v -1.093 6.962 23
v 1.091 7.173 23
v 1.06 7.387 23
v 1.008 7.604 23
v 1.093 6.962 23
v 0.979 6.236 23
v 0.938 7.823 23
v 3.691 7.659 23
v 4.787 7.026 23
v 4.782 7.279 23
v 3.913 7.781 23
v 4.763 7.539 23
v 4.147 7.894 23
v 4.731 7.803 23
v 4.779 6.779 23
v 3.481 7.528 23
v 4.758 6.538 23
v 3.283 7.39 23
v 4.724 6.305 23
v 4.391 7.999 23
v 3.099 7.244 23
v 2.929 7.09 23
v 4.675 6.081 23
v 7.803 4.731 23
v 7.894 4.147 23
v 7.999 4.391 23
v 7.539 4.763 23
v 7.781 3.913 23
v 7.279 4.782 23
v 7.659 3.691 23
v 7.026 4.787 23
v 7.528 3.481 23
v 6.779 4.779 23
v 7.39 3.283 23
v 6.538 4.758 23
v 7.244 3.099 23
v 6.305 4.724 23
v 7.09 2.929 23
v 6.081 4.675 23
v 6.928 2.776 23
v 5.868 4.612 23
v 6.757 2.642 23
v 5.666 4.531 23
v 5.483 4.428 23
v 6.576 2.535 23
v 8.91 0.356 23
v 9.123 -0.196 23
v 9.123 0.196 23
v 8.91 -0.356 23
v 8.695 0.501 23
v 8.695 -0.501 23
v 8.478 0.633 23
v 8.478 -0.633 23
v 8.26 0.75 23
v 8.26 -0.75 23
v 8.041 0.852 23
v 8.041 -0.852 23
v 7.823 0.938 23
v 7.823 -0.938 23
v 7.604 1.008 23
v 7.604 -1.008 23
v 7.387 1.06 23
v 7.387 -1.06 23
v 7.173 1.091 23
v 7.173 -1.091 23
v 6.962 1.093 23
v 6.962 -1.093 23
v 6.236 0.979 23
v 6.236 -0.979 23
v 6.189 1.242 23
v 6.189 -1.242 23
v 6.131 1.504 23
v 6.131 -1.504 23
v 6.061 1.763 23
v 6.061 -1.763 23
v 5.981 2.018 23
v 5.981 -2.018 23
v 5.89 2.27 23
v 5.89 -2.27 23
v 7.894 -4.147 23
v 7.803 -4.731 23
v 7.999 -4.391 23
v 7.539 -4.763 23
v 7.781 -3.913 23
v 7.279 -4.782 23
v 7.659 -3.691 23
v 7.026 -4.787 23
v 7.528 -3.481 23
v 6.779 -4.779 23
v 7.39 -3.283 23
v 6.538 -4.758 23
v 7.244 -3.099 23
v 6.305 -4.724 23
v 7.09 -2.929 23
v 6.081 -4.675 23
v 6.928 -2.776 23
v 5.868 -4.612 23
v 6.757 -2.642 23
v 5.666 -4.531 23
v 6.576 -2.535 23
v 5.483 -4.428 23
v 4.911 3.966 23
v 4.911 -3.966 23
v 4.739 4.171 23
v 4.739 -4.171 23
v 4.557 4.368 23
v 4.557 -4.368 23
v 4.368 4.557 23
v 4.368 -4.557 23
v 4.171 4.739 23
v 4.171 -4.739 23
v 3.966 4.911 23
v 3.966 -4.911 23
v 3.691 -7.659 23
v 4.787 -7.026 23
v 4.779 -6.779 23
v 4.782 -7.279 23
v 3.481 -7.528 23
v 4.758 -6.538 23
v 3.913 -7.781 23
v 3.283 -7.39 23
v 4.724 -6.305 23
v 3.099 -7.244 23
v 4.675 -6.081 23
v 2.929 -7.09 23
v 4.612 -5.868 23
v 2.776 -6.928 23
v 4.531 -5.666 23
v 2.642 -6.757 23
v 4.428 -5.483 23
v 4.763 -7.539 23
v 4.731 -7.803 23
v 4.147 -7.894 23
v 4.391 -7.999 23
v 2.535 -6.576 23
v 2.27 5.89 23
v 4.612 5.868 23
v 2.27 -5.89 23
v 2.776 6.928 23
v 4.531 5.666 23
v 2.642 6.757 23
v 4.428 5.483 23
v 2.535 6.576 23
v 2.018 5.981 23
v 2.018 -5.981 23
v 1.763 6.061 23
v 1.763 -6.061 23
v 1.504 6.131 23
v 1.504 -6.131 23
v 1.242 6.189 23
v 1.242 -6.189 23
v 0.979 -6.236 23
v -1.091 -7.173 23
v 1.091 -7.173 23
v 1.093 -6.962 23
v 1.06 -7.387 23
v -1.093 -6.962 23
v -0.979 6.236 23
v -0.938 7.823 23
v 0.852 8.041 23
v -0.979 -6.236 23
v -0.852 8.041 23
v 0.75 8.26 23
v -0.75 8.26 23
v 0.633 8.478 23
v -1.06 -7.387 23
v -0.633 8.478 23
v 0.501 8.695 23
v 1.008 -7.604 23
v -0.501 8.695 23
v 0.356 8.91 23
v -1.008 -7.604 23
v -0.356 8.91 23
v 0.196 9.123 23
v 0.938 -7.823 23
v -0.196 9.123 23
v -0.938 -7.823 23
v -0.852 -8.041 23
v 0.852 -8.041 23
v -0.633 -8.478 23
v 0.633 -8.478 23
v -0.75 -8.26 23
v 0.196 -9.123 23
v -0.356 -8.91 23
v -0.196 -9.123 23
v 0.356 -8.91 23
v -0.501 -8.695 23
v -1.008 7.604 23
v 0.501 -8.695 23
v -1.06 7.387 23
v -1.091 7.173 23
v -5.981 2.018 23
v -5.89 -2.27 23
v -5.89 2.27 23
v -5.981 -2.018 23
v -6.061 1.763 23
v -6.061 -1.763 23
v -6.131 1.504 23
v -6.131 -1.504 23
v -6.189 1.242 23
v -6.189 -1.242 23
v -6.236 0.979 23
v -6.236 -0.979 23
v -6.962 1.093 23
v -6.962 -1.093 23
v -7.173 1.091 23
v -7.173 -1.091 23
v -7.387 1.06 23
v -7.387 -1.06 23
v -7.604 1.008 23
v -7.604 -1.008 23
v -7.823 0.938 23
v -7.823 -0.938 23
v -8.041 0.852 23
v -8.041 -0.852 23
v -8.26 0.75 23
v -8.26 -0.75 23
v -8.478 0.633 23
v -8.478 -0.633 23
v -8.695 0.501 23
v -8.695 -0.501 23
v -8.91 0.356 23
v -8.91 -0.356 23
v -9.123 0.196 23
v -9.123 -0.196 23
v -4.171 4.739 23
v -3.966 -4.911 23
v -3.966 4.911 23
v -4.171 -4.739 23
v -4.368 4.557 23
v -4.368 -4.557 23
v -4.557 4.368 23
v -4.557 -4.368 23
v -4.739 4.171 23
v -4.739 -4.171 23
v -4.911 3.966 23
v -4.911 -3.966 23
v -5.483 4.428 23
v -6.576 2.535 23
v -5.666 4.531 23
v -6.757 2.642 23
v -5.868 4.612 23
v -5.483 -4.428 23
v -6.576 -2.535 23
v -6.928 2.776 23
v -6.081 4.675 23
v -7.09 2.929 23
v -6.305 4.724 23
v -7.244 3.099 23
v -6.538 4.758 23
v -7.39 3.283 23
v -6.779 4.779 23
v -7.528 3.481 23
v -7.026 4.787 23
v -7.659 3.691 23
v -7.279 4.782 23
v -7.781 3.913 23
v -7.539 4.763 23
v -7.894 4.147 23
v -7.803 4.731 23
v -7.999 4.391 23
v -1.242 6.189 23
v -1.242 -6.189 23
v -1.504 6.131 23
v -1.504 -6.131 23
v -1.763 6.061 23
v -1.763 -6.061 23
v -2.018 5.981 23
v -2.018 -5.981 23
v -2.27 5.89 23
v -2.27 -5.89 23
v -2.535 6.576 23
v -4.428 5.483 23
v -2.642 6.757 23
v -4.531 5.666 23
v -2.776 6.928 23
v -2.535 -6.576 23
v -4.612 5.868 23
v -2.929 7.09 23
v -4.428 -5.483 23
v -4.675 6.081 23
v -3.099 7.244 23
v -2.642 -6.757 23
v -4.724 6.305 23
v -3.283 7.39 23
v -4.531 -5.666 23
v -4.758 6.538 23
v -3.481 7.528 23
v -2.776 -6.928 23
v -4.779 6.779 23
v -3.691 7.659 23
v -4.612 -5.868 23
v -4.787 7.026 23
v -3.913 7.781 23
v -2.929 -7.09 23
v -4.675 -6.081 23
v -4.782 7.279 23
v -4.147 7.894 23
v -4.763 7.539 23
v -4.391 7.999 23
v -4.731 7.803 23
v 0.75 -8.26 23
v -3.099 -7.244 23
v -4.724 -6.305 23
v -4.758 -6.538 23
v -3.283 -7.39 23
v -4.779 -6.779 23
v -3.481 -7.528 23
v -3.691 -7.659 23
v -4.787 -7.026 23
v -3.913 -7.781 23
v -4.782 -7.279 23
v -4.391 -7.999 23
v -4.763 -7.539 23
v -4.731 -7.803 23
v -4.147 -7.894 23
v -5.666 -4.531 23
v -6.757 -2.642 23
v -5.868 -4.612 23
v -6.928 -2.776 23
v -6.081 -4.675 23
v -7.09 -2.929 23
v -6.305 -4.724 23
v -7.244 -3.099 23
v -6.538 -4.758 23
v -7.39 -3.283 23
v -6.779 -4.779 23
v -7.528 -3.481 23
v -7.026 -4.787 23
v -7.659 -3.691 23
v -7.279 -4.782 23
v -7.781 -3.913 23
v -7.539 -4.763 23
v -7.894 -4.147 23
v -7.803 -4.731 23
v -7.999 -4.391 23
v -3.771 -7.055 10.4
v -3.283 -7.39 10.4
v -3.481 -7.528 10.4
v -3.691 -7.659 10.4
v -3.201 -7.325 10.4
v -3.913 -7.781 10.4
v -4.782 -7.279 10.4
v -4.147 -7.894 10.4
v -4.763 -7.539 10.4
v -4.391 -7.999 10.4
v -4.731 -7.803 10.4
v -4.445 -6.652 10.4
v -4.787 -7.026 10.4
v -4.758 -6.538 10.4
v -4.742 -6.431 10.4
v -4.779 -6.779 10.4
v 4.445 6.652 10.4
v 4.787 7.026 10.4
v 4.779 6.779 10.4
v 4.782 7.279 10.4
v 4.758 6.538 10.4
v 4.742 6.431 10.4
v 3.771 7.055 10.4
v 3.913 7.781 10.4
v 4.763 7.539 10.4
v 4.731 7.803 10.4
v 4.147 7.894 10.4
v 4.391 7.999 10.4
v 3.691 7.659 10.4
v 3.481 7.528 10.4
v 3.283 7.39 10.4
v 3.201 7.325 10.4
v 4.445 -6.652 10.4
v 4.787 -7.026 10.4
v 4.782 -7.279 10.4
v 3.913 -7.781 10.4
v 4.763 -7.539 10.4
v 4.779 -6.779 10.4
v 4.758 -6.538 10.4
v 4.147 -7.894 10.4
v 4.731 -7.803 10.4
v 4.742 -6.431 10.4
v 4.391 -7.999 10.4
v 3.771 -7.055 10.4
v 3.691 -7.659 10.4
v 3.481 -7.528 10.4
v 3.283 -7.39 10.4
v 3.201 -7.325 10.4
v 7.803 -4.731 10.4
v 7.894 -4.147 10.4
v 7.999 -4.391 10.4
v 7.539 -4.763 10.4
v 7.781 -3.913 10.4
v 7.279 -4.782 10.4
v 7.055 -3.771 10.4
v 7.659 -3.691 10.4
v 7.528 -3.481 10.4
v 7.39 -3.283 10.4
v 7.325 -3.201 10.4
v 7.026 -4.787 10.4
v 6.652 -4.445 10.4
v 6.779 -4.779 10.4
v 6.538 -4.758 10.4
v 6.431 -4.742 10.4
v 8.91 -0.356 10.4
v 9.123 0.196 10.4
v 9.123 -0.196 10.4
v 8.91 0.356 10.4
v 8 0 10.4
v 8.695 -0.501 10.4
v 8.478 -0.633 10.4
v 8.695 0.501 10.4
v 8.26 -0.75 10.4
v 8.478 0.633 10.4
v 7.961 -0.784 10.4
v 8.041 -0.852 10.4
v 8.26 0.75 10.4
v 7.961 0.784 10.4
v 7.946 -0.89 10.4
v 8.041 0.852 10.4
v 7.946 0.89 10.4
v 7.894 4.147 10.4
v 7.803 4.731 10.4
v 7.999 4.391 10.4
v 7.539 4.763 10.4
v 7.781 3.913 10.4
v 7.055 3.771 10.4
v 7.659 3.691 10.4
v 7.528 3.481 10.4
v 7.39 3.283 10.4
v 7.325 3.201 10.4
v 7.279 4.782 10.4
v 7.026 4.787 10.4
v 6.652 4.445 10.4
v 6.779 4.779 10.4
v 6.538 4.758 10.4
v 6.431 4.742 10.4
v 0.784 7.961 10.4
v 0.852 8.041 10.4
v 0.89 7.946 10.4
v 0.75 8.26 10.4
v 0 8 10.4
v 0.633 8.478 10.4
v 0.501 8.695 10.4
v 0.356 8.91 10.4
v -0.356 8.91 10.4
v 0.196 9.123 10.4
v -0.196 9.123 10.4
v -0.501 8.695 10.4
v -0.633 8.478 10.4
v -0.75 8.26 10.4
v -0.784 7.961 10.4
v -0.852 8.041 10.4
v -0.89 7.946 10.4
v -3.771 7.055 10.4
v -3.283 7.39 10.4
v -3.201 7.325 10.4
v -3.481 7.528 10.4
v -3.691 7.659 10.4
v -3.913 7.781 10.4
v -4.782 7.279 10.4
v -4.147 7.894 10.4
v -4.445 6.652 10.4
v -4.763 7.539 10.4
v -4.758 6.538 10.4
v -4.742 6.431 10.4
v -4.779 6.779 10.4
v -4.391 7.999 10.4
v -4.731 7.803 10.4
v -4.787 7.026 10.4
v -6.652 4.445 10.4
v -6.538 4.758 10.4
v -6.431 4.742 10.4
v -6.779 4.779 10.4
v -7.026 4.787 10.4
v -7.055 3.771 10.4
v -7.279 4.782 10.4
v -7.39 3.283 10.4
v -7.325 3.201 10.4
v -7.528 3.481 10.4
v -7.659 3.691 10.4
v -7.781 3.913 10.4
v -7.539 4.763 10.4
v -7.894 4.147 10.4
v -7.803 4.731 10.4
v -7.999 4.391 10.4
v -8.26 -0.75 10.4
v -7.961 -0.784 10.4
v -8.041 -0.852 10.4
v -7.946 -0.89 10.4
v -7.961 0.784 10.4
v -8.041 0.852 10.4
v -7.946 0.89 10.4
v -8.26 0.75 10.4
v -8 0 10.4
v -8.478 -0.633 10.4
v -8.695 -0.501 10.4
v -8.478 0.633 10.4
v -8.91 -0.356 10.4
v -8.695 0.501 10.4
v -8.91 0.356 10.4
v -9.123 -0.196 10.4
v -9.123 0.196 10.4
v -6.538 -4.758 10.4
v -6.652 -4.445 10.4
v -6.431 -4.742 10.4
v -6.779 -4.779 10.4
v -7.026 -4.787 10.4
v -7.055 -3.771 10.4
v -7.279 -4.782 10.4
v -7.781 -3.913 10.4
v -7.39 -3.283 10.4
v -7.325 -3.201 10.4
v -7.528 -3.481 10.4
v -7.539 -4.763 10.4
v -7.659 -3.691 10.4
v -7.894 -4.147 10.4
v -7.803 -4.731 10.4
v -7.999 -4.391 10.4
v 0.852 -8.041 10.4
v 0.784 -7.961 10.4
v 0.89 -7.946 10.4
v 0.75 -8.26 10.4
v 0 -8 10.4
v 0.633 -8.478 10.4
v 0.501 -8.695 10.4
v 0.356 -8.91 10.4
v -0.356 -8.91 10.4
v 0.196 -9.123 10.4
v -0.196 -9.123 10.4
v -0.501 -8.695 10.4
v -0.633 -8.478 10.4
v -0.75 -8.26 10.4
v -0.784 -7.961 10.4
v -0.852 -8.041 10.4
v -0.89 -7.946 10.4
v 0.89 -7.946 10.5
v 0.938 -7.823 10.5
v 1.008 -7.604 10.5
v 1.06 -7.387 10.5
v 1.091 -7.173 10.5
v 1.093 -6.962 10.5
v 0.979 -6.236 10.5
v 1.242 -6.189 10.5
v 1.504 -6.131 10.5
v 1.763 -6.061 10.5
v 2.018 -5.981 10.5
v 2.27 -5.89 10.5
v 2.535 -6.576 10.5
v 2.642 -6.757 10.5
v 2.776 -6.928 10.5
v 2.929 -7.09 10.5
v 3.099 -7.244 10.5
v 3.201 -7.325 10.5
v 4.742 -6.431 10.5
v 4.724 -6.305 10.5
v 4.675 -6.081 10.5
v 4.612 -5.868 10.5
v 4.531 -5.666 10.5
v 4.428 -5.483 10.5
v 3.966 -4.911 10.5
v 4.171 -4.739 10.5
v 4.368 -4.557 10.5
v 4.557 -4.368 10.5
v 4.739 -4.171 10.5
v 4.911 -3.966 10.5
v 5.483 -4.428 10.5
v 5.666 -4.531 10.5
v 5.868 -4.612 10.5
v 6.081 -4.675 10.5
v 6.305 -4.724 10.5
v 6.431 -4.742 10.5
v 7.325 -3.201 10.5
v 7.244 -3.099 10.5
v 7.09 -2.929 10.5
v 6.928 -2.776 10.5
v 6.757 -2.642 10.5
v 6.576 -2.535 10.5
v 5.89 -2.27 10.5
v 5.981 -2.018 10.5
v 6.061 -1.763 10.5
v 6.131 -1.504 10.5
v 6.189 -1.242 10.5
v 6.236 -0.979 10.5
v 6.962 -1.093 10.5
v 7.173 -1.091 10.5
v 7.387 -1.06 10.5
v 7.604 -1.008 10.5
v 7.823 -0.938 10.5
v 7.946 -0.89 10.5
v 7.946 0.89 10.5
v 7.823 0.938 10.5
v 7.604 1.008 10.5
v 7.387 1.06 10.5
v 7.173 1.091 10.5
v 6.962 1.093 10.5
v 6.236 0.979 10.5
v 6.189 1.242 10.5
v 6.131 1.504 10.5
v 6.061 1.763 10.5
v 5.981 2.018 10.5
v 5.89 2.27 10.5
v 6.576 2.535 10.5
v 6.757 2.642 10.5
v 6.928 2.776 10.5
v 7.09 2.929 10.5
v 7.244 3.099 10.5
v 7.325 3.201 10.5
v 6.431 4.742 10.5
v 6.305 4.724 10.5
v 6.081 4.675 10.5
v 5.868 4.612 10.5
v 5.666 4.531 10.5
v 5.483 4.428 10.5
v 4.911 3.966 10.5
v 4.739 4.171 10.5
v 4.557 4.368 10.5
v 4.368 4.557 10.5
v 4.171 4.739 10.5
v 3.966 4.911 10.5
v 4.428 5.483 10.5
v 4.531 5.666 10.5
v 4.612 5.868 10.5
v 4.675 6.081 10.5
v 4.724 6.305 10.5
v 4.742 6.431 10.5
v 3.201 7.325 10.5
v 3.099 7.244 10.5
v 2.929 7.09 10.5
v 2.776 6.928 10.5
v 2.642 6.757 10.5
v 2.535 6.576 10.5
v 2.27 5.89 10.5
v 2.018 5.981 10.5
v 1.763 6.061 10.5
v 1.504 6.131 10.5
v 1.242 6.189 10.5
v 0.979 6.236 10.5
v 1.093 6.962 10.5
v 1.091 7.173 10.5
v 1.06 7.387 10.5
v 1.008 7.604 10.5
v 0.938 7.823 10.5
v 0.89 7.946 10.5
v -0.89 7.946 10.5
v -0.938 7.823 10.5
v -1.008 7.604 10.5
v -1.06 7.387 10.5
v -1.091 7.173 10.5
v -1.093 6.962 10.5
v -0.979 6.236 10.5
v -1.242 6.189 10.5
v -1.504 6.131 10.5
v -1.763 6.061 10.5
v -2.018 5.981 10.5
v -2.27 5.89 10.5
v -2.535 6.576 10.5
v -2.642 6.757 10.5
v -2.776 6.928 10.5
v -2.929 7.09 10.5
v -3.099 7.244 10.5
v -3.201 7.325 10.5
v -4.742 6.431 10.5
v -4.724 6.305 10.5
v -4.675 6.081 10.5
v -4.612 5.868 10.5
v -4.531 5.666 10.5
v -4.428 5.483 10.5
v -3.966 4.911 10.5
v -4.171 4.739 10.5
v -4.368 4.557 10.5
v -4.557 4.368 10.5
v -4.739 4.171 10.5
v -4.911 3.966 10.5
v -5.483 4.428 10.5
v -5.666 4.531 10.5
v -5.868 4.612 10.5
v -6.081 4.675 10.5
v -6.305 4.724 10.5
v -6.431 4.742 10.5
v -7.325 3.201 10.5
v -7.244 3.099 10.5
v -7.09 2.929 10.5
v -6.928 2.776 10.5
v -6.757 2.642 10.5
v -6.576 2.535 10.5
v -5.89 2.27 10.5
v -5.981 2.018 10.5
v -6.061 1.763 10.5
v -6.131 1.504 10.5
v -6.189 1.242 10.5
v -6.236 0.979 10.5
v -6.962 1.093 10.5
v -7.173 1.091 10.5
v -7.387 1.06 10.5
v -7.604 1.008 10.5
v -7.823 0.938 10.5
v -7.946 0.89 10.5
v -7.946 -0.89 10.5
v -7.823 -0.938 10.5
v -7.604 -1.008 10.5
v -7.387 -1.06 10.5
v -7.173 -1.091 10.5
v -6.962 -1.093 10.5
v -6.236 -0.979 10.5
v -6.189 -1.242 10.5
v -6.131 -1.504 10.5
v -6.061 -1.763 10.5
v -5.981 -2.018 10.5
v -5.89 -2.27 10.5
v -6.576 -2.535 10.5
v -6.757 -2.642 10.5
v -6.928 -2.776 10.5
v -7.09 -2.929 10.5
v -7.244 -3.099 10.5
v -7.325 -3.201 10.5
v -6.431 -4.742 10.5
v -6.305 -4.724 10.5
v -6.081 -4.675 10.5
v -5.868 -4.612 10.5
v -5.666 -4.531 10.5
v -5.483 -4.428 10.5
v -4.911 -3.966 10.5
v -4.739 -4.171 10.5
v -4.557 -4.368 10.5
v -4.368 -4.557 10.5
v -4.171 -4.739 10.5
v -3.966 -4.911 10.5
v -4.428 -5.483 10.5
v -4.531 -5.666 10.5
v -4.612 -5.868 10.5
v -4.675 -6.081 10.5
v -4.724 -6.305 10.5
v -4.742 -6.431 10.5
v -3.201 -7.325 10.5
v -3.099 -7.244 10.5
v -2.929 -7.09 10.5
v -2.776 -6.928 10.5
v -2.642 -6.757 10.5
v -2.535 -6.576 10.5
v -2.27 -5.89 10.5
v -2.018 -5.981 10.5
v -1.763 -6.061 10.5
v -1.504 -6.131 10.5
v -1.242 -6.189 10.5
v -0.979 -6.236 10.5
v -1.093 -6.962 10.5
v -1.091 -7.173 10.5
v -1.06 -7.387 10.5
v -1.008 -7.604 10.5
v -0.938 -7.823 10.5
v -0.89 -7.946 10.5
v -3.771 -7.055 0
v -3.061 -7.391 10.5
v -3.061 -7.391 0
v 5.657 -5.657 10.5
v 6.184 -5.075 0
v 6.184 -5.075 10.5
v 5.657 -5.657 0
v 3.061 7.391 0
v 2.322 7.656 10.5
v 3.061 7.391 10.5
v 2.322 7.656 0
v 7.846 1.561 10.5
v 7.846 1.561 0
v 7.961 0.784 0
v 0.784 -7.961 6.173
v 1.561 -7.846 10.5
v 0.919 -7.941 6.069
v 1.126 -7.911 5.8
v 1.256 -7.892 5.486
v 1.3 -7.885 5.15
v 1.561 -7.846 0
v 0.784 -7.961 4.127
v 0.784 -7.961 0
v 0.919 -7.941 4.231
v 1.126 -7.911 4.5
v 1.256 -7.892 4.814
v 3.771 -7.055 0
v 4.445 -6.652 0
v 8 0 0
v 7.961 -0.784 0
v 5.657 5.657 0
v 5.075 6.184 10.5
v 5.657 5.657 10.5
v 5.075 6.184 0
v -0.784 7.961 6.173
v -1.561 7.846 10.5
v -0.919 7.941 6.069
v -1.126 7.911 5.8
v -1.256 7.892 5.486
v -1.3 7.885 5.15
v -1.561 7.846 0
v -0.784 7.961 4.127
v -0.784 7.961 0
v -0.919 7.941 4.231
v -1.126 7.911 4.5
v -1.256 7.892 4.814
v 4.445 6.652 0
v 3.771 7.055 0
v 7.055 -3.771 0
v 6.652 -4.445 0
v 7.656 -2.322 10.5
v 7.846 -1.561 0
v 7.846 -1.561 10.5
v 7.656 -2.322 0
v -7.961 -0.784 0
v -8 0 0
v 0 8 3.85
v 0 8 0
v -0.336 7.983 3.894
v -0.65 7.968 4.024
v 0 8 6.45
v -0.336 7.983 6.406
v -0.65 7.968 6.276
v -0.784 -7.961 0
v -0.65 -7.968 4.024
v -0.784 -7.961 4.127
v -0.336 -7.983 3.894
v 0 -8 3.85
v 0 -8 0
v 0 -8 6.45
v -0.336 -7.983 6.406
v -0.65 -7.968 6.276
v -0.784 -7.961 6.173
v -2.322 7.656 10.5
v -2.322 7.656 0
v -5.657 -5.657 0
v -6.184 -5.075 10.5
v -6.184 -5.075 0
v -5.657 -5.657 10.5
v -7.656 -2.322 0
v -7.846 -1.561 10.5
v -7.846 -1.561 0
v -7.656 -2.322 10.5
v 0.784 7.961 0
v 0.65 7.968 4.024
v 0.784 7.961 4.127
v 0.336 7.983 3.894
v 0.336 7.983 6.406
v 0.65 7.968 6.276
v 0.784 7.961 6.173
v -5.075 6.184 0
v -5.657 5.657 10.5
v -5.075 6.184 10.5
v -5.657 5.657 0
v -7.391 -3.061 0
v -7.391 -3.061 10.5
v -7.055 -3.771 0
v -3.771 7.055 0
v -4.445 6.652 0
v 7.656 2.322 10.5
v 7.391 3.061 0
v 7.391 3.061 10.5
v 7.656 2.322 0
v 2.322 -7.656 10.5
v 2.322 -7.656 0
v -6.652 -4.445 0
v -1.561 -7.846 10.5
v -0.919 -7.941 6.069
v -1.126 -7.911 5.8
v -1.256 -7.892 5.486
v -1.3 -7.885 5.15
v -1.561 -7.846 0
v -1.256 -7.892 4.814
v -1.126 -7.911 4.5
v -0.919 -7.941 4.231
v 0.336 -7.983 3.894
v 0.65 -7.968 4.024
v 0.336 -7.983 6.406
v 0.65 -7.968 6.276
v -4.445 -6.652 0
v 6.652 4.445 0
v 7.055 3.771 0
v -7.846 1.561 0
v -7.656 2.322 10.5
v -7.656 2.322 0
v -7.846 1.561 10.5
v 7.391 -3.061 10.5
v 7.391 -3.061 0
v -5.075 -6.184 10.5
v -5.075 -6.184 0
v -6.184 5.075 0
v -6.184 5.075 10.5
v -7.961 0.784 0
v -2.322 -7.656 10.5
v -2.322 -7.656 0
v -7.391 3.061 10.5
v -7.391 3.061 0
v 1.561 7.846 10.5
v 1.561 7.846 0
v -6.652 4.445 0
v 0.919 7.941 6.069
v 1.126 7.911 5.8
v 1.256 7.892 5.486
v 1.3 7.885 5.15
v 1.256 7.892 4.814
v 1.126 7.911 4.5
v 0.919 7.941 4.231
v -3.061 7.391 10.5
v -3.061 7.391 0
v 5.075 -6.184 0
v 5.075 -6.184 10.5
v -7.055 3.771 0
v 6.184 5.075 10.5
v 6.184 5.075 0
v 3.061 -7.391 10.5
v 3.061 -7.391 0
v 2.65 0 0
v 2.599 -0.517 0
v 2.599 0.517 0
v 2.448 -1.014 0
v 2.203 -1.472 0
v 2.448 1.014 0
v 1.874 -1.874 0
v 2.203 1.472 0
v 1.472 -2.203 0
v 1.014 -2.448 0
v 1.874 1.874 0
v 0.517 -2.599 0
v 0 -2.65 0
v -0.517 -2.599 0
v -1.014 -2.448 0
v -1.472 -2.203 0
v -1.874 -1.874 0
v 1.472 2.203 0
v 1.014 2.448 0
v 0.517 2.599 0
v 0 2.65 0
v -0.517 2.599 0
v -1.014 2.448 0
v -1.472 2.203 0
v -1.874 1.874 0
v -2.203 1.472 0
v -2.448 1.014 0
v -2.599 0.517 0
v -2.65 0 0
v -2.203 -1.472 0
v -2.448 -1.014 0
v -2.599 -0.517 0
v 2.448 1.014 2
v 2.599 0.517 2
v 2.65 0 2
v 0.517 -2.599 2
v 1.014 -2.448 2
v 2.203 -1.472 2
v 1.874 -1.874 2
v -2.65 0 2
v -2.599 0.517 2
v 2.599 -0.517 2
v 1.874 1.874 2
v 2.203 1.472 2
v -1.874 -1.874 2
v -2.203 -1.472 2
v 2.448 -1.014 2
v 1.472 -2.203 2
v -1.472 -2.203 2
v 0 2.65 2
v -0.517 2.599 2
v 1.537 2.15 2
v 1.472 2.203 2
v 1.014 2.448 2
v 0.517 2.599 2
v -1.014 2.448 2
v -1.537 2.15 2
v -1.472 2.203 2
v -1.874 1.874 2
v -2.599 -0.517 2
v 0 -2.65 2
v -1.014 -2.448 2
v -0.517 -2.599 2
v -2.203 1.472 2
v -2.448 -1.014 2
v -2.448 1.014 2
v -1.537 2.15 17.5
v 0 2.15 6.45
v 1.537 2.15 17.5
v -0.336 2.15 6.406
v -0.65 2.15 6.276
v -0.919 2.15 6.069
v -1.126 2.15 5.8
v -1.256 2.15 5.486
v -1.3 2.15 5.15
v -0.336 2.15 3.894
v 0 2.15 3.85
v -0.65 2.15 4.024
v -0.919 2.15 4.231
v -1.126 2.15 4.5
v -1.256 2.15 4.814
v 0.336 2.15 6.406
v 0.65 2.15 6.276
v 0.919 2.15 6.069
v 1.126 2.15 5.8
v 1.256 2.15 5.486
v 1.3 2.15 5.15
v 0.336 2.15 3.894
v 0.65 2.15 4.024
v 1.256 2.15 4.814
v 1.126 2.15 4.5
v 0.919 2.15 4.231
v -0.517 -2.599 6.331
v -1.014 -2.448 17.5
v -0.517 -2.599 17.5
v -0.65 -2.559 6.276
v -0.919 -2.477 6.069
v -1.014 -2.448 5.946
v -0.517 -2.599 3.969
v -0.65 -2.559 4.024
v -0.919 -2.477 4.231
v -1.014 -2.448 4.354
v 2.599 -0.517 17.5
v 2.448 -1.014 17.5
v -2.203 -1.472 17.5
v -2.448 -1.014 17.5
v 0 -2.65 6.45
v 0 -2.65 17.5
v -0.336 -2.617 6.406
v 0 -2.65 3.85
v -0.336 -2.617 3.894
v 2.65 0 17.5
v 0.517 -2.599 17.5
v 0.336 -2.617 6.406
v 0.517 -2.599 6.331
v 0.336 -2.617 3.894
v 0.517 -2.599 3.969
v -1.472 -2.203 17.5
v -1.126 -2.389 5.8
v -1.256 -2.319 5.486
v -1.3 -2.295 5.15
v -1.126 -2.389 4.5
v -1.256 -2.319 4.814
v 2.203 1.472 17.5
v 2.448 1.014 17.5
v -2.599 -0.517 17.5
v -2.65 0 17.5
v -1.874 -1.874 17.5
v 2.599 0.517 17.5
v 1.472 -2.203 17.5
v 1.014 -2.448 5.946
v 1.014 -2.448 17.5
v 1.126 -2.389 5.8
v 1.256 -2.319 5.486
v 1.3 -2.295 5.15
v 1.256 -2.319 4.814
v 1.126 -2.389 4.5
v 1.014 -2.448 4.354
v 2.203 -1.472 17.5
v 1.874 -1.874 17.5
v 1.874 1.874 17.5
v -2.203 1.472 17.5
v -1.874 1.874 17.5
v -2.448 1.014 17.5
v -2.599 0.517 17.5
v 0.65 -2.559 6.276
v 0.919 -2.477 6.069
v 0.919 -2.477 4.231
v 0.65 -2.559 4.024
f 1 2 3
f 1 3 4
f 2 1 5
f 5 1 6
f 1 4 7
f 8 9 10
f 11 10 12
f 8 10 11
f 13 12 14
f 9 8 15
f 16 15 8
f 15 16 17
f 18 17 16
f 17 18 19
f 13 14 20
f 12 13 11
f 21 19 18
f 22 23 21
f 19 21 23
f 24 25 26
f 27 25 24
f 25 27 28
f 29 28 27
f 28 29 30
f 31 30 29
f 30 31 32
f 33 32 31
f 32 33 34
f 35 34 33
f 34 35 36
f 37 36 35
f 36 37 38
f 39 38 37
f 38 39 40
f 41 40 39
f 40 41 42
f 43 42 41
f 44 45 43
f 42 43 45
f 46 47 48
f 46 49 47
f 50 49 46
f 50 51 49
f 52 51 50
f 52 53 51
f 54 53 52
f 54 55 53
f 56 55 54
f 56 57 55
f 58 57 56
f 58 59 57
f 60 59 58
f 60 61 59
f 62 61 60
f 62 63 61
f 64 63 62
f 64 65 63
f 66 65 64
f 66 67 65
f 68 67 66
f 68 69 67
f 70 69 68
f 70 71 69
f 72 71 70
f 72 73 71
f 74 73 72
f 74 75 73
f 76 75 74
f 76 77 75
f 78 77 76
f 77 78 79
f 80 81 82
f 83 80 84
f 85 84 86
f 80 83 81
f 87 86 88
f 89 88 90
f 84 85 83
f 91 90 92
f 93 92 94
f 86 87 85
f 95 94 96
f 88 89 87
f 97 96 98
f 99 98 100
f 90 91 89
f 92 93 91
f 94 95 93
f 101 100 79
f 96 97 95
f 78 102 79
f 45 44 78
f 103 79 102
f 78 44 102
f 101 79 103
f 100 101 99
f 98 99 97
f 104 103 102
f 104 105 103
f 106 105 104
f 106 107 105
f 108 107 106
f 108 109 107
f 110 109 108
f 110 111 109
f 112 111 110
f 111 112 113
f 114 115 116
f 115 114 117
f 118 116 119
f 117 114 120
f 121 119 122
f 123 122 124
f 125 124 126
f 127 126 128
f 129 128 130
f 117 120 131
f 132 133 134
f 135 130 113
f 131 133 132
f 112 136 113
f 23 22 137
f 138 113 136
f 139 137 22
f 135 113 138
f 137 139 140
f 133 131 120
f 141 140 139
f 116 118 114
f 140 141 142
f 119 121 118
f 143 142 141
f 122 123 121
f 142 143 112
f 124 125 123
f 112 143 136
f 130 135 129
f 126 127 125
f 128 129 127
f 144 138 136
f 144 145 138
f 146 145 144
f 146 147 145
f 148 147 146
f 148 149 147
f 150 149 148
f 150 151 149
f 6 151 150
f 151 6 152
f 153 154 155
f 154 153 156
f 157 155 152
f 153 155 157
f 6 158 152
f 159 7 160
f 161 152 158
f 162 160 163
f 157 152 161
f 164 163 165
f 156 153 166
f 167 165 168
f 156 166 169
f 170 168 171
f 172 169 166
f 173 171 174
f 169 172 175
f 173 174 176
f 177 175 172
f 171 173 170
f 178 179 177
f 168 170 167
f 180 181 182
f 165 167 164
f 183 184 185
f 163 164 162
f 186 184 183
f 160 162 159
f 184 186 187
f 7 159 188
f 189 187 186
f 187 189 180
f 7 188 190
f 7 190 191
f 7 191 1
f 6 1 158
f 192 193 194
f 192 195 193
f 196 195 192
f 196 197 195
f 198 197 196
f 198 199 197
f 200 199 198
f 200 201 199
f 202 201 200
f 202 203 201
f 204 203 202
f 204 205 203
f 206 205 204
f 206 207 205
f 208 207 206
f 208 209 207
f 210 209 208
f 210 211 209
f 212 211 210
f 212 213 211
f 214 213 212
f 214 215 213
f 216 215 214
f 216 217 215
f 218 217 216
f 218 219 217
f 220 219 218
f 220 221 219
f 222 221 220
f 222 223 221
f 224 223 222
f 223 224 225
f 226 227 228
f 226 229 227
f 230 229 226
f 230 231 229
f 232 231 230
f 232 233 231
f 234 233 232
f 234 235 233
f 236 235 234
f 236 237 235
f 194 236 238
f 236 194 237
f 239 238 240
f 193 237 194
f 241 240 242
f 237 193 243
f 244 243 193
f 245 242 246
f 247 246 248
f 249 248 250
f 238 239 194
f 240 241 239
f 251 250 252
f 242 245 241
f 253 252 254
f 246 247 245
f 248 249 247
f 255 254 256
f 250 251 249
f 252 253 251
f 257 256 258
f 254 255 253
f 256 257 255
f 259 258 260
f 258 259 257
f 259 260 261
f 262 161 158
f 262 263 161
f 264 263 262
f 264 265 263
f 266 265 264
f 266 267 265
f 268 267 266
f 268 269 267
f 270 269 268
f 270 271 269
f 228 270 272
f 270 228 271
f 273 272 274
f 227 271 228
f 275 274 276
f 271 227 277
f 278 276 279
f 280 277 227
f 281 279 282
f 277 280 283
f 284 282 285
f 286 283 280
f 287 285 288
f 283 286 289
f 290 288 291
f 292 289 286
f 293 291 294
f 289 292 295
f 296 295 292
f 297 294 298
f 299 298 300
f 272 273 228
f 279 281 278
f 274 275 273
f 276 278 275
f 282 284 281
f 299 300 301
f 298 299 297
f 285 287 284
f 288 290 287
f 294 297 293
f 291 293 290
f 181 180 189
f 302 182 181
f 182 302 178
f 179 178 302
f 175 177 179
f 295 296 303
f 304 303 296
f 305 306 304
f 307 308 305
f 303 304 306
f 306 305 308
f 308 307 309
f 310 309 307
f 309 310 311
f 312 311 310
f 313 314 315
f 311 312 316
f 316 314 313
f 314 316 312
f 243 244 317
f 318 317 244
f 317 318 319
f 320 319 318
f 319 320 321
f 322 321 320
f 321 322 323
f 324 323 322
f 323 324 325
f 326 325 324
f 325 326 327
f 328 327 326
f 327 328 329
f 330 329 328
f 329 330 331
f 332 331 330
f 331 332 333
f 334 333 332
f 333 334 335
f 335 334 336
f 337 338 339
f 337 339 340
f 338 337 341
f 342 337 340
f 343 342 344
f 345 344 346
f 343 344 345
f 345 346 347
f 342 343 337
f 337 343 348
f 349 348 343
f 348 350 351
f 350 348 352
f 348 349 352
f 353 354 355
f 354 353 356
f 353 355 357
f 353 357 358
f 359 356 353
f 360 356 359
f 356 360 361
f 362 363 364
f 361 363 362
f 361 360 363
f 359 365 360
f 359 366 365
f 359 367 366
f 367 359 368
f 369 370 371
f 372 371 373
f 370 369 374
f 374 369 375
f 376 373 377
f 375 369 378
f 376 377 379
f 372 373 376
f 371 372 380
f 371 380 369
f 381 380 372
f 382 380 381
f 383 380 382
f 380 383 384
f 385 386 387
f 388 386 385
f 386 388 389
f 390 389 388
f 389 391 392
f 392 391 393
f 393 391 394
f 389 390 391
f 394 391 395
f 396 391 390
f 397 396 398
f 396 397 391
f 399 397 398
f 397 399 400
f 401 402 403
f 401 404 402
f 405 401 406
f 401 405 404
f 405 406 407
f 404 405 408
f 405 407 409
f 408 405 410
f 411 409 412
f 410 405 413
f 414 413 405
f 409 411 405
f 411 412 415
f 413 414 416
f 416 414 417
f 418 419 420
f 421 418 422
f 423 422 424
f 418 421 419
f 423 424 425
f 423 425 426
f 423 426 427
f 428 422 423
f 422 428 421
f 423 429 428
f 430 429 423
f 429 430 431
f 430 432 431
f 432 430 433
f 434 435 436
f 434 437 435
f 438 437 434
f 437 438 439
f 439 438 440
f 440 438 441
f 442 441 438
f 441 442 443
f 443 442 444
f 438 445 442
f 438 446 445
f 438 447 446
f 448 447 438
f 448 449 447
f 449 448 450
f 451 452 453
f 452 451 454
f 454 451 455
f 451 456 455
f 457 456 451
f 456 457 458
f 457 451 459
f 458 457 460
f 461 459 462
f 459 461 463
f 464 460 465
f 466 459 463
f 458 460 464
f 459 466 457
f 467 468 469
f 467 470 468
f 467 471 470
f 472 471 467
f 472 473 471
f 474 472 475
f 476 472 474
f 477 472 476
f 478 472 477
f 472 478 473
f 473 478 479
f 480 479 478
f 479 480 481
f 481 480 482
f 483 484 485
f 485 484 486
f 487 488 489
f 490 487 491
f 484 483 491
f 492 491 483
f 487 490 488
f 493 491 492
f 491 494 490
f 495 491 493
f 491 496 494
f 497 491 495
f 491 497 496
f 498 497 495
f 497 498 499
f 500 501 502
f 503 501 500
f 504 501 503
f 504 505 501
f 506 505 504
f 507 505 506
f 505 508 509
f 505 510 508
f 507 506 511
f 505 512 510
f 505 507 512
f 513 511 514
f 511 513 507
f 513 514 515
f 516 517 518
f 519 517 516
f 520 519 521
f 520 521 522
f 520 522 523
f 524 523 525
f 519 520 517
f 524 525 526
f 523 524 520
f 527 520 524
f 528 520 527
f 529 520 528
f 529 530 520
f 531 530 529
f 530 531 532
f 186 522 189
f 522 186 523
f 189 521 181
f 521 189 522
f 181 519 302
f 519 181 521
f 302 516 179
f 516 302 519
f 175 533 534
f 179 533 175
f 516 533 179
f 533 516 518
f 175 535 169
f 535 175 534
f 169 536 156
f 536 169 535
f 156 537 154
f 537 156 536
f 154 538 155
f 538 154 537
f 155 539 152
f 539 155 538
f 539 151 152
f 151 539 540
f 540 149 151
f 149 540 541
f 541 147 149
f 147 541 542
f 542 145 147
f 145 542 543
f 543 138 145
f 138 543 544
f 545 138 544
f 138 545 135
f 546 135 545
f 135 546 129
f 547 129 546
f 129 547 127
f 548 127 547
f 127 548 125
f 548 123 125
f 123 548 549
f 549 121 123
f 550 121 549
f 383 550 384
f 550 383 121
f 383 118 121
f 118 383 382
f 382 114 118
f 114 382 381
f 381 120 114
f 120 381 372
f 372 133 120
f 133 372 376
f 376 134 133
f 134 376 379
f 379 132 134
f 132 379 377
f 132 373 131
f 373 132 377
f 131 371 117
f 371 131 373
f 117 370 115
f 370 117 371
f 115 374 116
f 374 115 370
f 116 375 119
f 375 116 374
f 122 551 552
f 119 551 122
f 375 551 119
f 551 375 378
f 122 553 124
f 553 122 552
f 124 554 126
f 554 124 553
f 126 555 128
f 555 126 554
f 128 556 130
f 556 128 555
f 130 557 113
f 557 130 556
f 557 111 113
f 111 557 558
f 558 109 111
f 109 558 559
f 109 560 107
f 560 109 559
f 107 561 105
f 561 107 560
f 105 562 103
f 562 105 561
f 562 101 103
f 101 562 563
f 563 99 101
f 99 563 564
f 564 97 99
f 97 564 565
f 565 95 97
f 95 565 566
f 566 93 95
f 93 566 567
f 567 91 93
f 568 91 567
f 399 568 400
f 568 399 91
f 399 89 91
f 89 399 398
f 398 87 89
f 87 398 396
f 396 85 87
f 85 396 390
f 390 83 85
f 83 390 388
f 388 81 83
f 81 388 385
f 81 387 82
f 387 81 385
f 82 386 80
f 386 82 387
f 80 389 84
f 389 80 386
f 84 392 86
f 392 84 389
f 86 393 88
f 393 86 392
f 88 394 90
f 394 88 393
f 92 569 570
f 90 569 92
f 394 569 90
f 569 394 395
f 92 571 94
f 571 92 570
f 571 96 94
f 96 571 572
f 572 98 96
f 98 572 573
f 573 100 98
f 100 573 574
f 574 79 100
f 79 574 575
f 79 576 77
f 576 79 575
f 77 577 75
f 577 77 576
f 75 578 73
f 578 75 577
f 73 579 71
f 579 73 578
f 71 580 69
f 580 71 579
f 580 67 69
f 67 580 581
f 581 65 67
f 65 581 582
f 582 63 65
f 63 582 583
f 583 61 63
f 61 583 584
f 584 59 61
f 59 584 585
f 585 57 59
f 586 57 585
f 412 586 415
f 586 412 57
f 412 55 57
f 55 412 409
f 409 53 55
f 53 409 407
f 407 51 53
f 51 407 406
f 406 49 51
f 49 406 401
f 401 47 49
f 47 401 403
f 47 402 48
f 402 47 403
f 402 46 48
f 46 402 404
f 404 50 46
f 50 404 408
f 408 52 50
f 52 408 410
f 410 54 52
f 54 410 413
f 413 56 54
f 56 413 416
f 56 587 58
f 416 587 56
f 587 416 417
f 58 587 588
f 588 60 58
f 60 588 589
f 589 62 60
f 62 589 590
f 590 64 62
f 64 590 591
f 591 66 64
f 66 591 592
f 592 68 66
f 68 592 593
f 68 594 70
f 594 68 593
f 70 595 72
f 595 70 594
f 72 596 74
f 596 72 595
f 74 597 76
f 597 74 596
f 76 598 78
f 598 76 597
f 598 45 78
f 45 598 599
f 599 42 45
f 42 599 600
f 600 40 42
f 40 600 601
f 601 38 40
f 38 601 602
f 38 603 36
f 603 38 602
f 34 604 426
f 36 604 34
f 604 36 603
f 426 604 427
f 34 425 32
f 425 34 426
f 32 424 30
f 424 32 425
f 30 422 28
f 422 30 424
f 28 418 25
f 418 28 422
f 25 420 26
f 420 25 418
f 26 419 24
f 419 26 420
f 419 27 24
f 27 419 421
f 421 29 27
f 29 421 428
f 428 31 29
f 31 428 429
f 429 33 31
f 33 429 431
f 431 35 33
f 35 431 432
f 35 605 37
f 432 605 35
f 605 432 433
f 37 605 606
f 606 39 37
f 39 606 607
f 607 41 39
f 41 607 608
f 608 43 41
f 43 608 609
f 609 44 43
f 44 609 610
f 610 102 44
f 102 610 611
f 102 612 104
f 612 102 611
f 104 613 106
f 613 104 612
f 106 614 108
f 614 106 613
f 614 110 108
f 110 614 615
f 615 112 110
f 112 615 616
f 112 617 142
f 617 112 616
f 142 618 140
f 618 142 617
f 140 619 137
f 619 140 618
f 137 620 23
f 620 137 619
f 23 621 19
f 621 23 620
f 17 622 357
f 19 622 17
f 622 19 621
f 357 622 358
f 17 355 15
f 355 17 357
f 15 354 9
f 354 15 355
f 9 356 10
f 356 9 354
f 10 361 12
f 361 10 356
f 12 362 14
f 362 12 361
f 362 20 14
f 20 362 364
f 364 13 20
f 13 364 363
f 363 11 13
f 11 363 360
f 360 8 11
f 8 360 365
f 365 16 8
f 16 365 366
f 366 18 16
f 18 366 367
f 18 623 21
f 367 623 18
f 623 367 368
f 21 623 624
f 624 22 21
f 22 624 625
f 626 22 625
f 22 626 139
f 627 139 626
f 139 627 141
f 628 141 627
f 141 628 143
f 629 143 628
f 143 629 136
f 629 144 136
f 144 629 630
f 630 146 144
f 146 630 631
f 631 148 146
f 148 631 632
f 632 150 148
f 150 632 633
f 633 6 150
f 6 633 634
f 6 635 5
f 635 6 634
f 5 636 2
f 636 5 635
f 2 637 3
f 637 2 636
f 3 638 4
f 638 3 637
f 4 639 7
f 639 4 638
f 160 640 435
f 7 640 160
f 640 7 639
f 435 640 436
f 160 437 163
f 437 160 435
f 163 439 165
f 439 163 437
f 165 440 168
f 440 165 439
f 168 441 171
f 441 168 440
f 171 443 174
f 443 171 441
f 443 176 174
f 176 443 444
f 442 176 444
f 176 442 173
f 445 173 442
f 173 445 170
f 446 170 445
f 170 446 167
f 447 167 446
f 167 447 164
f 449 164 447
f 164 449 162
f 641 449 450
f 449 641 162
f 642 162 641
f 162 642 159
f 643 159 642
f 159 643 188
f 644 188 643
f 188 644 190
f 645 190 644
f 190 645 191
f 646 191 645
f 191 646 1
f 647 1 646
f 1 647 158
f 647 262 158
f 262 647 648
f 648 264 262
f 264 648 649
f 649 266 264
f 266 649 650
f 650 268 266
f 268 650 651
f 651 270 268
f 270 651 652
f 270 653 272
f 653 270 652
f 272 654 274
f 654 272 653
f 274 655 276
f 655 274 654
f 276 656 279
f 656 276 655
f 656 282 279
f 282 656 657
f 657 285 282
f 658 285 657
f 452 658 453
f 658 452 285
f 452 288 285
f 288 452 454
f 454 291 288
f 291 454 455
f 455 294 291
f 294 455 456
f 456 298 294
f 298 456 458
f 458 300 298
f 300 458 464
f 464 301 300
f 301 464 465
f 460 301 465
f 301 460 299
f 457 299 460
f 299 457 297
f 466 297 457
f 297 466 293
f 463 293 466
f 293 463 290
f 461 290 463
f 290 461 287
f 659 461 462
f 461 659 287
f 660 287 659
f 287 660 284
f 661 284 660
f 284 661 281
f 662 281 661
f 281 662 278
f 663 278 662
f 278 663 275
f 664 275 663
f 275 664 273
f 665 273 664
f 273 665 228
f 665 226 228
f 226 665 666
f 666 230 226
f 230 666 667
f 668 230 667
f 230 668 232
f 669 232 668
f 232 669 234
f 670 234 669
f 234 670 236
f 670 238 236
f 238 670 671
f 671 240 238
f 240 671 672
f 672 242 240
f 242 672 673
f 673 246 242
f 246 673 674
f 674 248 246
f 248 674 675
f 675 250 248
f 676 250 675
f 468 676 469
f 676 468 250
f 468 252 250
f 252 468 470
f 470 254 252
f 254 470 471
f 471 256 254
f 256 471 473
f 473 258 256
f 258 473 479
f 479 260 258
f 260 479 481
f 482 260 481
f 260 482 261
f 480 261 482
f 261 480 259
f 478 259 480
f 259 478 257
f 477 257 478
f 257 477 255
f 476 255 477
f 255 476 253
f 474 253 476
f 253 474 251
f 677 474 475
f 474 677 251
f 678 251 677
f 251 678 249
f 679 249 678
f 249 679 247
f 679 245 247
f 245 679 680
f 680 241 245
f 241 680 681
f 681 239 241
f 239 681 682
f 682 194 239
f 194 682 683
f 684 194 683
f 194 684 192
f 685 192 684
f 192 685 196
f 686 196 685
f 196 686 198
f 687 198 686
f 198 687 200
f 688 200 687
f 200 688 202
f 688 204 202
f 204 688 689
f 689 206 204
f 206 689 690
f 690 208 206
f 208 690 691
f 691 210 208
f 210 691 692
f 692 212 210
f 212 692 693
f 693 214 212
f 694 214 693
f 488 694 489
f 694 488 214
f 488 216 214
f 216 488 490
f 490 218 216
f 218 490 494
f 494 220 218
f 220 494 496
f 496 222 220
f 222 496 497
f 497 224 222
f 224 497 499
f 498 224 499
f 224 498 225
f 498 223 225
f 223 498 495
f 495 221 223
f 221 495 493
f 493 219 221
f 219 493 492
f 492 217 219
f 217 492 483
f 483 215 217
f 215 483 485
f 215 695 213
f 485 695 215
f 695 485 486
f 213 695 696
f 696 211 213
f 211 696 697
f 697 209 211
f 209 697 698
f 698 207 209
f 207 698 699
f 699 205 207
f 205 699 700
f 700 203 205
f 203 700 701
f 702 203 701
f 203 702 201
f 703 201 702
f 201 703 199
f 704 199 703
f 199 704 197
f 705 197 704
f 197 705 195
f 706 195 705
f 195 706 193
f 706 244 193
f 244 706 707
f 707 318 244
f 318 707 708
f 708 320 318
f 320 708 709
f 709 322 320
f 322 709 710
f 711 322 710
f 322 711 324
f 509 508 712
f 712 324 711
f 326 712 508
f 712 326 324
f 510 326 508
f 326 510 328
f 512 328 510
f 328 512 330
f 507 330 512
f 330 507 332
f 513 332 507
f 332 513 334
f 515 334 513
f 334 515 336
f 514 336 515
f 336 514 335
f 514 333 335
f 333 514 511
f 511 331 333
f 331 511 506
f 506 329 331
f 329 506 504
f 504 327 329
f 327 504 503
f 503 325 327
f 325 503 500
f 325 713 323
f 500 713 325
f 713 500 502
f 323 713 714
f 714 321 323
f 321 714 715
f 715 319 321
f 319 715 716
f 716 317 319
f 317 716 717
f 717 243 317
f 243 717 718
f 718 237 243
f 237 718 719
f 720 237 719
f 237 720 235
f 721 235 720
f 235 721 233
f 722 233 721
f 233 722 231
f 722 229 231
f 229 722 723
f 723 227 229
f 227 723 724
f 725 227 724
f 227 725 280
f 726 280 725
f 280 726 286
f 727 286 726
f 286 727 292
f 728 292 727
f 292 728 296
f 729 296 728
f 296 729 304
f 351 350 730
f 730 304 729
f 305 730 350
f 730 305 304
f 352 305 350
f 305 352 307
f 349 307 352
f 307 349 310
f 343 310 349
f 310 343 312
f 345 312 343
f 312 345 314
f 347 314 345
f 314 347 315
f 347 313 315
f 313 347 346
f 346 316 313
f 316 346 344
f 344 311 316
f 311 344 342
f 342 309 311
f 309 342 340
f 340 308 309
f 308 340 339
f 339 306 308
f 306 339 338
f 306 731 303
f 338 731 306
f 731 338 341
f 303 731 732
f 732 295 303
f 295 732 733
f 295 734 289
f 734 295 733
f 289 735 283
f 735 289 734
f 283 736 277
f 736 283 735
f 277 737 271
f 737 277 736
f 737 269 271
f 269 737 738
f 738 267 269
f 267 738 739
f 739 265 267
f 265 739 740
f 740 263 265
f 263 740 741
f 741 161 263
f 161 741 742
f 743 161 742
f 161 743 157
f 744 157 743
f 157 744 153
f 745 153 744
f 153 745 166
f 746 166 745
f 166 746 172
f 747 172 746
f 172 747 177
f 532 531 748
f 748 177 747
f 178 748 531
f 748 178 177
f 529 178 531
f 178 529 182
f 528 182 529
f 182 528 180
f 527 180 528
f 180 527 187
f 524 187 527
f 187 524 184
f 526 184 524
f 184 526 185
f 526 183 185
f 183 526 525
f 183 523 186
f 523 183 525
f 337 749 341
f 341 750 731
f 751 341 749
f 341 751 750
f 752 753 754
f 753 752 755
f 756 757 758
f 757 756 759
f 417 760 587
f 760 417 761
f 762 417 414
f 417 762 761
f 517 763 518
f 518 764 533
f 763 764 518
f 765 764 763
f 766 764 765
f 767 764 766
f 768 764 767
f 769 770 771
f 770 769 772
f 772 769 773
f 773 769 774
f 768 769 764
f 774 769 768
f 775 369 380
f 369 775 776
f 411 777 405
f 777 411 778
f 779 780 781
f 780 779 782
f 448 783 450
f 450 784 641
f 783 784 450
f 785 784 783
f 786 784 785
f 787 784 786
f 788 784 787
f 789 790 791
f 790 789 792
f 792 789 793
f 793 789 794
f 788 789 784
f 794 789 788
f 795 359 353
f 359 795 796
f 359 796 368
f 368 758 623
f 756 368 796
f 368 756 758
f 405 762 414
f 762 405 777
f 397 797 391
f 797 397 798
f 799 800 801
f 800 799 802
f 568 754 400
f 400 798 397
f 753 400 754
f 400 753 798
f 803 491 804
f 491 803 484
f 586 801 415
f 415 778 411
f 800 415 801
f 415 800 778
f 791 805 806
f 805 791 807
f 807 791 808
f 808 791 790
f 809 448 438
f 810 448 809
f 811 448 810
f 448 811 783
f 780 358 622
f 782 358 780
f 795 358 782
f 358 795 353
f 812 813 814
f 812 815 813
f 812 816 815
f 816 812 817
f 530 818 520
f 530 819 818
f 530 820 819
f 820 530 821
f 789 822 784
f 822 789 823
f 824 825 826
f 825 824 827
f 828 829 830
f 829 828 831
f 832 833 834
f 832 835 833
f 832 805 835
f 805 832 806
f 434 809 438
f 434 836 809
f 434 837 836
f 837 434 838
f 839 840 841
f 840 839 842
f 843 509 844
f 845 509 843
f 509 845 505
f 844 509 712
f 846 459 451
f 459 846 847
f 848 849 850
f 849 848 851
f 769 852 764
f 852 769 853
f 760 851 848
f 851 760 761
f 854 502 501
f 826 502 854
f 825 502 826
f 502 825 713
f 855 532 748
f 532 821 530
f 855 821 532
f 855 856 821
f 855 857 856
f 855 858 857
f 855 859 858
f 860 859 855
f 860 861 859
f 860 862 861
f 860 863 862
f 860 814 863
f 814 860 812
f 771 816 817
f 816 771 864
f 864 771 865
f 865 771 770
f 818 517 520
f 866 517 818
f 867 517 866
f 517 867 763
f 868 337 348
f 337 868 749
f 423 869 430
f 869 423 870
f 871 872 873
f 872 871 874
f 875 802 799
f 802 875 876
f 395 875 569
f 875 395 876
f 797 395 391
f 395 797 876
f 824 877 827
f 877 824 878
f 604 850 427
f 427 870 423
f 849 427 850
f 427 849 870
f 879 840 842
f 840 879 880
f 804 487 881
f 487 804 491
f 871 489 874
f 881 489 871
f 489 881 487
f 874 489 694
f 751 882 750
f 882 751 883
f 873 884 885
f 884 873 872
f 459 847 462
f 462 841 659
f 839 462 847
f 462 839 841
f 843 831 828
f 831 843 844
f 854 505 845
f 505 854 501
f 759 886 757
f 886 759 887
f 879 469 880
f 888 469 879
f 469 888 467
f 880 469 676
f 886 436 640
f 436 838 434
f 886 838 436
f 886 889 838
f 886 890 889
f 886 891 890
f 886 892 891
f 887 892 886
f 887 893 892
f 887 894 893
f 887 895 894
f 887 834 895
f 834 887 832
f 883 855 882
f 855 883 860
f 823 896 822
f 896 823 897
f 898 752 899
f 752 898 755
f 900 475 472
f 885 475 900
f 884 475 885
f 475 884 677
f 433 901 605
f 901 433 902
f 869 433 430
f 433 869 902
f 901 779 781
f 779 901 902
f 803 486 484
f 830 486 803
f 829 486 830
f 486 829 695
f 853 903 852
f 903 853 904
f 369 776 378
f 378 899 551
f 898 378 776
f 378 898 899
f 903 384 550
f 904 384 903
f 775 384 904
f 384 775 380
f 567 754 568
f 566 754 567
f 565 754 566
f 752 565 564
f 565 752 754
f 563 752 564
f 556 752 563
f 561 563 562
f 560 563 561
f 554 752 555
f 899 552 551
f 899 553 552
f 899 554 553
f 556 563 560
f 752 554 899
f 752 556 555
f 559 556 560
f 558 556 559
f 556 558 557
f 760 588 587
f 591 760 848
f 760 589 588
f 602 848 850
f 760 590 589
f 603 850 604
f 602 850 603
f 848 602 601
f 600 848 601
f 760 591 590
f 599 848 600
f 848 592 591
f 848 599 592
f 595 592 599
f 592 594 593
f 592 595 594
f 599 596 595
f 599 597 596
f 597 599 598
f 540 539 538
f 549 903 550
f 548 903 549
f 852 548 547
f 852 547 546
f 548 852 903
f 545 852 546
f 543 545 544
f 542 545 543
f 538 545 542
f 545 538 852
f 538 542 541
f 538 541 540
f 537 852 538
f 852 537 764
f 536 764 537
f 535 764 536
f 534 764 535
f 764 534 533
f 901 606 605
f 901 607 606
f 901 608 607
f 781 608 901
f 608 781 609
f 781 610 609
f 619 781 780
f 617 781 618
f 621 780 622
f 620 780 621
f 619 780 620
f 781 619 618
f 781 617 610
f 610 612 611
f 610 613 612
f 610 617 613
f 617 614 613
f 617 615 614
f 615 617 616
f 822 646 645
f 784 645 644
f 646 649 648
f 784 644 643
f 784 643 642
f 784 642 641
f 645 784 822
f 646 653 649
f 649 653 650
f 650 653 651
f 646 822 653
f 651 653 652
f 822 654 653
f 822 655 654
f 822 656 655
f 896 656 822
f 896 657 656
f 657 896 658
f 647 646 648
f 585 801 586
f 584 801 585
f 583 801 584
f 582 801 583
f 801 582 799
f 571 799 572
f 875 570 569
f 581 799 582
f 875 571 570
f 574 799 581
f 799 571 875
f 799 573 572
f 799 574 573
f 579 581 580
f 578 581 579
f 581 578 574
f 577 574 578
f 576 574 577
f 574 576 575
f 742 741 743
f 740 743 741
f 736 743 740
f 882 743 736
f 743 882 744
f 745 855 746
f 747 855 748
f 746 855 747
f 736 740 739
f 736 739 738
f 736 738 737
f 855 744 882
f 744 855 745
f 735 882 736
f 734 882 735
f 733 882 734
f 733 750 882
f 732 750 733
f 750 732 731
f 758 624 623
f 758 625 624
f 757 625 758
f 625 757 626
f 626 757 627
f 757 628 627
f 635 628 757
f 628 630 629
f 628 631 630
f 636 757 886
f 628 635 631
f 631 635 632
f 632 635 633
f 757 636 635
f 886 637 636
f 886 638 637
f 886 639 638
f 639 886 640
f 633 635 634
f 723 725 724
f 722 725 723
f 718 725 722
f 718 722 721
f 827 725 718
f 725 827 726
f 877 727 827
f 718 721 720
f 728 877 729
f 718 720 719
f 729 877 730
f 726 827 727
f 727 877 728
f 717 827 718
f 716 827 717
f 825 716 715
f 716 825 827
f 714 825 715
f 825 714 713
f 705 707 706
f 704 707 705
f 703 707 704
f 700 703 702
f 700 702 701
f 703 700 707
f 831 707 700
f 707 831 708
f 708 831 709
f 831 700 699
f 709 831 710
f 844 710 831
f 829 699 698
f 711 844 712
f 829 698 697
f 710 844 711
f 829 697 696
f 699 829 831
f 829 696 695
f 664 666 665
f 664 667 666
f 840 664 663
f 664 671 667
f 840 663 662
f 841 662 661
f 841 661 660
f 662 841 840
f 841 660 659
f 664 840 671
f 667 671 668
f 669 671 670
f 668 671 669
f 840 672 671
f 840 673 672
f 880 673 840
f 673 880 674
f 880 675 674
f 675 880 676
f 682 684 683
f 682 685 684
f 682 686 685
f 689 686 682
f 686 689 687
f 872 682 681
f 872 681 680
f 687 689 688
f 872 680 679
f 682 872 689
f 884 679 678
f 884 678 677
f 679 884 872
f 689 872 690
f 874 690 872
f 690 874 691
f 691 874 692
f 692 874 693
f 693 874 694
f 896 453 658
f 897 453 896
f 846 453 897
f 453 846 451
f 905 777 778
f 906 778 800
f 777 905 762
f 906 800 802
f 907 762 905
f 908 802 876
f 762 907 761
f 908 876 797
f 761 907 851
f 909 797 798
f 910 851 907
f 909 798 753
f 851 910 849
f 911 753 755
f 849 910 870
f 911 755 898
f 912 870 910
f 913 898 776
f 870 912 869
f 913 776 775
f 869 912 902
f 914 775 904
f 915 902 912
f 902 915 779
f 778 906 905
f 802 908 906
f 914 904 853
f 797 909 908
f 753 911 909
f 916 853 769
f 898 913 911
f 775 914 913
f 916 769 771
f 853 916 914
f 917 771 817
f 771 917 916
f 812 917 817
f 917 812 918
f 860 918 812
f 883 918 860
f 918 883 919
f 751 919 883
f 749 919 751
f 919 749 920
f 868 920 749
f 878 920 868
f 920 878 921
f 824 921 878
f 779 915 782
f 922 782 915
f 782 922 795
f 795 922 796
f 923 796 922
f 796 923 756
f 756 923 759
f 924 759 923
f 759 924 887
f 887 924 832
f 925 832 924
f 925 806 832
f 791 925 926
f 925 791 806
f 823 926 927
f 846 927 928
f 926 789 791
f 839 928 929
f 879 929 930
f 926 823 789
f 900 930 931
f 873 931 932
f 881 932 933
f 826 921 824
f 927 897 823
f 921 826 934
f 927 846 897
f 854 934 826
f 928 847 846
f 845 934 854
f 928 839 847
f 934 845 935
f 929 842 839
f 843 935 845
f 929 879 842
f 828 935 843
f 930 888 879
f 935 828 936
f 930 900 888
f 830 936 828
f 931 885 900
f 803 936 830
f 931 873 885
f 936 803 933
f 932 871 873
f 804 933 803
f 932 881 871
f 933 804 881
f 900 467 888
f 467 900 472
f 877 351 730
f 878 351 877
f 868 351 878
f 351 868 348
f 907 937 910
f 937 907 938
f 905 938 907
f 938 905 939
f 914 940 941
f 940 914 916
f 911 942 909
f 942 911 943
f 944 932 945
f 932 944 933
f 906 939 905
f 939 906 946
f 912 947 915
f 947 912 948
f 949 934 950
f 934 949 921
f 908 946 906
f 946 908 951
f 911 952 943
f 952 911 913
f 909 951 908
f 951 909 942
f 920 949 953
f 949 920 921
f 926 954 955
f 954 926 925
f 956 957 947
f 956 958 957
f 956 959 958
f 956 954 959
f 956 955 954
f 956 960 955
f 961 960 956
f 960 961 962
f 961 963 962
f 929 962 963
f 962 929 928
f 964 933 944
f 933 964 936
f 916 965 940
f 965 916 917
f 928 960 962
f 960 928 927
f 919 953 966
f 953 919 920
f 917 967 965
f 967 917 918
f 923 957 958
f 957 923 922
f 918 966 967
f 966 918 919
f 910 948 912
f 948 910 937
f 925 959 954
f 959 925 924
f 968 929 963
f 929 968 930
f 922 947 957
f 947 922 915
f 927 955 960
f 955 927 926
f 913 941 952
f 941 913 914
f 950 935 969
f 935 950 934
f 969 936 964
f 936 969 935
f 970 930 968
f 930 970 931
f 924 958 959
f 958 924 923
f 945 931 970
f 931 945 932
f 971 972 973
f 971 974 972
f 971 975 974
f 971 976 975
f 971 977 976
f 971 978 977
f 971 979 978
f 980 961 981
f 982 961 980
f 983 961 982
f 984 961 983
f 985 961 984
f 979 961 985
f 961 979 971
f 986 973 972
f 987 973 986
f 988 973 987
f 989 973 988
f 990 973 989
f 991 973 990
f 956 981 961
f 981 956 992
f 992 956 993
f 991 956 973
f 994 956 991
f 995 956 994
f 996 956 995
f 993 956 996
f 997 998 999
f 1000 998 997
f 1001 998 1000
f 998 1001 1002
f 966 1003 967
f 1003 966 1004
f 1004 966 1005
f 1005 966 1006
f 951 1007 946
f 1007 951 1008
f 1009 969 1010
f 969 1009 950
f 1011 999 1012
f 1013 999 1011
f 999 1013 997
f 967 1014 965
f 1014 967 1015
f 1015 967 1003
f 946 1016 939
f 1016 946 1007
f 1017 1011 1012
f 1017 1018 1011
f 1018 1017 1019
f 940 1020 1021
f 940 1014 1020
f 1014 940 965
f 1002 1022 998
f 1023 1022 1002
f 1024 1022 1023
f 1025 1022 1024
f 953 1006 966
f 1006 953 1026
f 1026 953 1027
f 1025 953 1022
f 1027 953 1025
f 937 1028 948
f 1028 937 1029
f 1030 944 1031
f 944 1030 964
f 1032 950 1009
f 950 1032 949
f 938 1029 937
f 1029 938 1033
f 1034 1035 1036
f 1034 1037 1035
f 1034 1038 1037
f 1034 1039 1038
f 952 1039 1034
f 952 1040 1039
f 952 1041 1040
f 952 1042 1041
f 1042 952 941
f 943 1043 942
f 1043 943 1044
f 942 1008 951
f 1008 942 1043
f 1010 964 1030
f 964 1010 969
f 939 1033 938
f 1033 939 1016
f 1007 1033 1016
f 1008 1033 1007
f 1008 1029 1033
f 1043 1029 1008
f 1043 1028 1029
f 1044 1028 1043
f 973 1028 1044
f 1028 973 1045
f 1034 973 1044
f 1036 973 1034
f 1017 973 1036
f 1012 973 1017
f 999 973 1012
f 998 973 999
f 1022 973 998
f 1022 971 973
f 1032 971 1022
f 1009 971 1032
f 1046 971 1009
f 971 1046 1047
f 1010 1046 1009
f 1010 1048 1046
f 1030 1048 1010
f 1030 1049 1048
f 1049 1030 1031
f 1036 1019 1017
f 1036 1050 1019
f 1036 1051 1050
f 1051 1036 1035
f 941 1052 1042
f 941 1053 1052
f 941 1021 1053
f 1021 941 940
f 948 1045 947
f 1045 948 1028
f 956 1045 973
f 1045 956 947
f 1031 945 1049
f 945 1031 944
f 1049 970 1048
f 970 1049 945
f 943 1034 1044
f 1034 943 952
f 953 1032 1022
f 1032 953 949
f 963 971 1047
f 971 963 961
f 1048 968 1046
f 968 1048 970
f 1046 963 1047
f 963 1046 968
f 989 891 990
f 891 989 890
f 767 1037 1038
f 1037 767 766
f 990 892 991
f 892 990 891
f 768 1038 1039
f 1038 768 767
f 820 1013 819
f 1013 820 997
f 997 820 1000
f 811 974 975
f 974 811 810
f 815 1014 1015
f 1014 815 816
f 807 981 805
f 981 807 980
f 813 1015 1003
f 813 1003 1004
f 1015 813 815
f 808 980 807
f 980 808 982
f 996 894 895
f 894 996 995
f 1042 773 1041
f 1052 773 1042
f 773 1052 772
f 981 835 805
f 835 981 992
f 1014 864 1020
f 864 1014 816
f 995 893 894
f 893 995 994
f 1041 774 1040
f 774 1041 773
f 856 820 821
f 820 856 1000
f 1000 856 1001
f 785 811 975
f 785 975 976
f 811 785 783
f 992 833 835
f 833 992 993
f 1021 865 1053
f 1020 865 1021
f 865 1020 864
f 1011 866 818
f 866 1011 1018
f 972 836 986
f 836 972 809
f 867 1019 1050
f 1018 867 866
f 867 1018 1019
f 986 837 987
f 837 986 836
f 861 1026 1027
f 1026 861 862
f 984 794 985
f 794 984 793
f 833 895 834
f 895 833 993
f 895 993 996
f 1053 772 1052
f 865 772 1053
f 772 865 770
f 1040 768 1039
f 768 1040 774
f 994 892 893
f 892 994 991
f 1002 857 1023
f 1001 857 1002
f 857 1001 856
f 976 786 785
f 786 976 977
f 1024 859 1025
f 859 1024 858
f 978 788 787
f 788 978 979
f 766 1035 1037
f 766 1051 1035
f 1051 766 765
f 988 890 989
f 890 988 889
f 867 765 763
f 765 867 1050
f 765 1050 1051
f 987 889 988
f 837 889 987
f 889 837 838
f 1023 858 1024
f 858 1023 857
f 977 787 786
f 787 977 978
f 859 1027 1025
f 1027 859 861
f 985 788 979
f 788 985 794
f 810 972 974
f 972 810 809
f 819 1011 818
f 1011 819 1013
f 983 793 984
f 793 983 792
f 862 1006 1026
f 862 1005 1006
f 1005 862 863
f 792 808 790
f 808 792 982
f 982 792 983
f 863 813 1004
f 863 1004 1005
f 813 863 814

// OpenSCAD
// Print-ready export: key-turner 12T pinion (hub end down, PETG-CF) (v2, 5:1; see key_turner_housing.scad)
use <key_turner_housing.scad>
print_pinion();
